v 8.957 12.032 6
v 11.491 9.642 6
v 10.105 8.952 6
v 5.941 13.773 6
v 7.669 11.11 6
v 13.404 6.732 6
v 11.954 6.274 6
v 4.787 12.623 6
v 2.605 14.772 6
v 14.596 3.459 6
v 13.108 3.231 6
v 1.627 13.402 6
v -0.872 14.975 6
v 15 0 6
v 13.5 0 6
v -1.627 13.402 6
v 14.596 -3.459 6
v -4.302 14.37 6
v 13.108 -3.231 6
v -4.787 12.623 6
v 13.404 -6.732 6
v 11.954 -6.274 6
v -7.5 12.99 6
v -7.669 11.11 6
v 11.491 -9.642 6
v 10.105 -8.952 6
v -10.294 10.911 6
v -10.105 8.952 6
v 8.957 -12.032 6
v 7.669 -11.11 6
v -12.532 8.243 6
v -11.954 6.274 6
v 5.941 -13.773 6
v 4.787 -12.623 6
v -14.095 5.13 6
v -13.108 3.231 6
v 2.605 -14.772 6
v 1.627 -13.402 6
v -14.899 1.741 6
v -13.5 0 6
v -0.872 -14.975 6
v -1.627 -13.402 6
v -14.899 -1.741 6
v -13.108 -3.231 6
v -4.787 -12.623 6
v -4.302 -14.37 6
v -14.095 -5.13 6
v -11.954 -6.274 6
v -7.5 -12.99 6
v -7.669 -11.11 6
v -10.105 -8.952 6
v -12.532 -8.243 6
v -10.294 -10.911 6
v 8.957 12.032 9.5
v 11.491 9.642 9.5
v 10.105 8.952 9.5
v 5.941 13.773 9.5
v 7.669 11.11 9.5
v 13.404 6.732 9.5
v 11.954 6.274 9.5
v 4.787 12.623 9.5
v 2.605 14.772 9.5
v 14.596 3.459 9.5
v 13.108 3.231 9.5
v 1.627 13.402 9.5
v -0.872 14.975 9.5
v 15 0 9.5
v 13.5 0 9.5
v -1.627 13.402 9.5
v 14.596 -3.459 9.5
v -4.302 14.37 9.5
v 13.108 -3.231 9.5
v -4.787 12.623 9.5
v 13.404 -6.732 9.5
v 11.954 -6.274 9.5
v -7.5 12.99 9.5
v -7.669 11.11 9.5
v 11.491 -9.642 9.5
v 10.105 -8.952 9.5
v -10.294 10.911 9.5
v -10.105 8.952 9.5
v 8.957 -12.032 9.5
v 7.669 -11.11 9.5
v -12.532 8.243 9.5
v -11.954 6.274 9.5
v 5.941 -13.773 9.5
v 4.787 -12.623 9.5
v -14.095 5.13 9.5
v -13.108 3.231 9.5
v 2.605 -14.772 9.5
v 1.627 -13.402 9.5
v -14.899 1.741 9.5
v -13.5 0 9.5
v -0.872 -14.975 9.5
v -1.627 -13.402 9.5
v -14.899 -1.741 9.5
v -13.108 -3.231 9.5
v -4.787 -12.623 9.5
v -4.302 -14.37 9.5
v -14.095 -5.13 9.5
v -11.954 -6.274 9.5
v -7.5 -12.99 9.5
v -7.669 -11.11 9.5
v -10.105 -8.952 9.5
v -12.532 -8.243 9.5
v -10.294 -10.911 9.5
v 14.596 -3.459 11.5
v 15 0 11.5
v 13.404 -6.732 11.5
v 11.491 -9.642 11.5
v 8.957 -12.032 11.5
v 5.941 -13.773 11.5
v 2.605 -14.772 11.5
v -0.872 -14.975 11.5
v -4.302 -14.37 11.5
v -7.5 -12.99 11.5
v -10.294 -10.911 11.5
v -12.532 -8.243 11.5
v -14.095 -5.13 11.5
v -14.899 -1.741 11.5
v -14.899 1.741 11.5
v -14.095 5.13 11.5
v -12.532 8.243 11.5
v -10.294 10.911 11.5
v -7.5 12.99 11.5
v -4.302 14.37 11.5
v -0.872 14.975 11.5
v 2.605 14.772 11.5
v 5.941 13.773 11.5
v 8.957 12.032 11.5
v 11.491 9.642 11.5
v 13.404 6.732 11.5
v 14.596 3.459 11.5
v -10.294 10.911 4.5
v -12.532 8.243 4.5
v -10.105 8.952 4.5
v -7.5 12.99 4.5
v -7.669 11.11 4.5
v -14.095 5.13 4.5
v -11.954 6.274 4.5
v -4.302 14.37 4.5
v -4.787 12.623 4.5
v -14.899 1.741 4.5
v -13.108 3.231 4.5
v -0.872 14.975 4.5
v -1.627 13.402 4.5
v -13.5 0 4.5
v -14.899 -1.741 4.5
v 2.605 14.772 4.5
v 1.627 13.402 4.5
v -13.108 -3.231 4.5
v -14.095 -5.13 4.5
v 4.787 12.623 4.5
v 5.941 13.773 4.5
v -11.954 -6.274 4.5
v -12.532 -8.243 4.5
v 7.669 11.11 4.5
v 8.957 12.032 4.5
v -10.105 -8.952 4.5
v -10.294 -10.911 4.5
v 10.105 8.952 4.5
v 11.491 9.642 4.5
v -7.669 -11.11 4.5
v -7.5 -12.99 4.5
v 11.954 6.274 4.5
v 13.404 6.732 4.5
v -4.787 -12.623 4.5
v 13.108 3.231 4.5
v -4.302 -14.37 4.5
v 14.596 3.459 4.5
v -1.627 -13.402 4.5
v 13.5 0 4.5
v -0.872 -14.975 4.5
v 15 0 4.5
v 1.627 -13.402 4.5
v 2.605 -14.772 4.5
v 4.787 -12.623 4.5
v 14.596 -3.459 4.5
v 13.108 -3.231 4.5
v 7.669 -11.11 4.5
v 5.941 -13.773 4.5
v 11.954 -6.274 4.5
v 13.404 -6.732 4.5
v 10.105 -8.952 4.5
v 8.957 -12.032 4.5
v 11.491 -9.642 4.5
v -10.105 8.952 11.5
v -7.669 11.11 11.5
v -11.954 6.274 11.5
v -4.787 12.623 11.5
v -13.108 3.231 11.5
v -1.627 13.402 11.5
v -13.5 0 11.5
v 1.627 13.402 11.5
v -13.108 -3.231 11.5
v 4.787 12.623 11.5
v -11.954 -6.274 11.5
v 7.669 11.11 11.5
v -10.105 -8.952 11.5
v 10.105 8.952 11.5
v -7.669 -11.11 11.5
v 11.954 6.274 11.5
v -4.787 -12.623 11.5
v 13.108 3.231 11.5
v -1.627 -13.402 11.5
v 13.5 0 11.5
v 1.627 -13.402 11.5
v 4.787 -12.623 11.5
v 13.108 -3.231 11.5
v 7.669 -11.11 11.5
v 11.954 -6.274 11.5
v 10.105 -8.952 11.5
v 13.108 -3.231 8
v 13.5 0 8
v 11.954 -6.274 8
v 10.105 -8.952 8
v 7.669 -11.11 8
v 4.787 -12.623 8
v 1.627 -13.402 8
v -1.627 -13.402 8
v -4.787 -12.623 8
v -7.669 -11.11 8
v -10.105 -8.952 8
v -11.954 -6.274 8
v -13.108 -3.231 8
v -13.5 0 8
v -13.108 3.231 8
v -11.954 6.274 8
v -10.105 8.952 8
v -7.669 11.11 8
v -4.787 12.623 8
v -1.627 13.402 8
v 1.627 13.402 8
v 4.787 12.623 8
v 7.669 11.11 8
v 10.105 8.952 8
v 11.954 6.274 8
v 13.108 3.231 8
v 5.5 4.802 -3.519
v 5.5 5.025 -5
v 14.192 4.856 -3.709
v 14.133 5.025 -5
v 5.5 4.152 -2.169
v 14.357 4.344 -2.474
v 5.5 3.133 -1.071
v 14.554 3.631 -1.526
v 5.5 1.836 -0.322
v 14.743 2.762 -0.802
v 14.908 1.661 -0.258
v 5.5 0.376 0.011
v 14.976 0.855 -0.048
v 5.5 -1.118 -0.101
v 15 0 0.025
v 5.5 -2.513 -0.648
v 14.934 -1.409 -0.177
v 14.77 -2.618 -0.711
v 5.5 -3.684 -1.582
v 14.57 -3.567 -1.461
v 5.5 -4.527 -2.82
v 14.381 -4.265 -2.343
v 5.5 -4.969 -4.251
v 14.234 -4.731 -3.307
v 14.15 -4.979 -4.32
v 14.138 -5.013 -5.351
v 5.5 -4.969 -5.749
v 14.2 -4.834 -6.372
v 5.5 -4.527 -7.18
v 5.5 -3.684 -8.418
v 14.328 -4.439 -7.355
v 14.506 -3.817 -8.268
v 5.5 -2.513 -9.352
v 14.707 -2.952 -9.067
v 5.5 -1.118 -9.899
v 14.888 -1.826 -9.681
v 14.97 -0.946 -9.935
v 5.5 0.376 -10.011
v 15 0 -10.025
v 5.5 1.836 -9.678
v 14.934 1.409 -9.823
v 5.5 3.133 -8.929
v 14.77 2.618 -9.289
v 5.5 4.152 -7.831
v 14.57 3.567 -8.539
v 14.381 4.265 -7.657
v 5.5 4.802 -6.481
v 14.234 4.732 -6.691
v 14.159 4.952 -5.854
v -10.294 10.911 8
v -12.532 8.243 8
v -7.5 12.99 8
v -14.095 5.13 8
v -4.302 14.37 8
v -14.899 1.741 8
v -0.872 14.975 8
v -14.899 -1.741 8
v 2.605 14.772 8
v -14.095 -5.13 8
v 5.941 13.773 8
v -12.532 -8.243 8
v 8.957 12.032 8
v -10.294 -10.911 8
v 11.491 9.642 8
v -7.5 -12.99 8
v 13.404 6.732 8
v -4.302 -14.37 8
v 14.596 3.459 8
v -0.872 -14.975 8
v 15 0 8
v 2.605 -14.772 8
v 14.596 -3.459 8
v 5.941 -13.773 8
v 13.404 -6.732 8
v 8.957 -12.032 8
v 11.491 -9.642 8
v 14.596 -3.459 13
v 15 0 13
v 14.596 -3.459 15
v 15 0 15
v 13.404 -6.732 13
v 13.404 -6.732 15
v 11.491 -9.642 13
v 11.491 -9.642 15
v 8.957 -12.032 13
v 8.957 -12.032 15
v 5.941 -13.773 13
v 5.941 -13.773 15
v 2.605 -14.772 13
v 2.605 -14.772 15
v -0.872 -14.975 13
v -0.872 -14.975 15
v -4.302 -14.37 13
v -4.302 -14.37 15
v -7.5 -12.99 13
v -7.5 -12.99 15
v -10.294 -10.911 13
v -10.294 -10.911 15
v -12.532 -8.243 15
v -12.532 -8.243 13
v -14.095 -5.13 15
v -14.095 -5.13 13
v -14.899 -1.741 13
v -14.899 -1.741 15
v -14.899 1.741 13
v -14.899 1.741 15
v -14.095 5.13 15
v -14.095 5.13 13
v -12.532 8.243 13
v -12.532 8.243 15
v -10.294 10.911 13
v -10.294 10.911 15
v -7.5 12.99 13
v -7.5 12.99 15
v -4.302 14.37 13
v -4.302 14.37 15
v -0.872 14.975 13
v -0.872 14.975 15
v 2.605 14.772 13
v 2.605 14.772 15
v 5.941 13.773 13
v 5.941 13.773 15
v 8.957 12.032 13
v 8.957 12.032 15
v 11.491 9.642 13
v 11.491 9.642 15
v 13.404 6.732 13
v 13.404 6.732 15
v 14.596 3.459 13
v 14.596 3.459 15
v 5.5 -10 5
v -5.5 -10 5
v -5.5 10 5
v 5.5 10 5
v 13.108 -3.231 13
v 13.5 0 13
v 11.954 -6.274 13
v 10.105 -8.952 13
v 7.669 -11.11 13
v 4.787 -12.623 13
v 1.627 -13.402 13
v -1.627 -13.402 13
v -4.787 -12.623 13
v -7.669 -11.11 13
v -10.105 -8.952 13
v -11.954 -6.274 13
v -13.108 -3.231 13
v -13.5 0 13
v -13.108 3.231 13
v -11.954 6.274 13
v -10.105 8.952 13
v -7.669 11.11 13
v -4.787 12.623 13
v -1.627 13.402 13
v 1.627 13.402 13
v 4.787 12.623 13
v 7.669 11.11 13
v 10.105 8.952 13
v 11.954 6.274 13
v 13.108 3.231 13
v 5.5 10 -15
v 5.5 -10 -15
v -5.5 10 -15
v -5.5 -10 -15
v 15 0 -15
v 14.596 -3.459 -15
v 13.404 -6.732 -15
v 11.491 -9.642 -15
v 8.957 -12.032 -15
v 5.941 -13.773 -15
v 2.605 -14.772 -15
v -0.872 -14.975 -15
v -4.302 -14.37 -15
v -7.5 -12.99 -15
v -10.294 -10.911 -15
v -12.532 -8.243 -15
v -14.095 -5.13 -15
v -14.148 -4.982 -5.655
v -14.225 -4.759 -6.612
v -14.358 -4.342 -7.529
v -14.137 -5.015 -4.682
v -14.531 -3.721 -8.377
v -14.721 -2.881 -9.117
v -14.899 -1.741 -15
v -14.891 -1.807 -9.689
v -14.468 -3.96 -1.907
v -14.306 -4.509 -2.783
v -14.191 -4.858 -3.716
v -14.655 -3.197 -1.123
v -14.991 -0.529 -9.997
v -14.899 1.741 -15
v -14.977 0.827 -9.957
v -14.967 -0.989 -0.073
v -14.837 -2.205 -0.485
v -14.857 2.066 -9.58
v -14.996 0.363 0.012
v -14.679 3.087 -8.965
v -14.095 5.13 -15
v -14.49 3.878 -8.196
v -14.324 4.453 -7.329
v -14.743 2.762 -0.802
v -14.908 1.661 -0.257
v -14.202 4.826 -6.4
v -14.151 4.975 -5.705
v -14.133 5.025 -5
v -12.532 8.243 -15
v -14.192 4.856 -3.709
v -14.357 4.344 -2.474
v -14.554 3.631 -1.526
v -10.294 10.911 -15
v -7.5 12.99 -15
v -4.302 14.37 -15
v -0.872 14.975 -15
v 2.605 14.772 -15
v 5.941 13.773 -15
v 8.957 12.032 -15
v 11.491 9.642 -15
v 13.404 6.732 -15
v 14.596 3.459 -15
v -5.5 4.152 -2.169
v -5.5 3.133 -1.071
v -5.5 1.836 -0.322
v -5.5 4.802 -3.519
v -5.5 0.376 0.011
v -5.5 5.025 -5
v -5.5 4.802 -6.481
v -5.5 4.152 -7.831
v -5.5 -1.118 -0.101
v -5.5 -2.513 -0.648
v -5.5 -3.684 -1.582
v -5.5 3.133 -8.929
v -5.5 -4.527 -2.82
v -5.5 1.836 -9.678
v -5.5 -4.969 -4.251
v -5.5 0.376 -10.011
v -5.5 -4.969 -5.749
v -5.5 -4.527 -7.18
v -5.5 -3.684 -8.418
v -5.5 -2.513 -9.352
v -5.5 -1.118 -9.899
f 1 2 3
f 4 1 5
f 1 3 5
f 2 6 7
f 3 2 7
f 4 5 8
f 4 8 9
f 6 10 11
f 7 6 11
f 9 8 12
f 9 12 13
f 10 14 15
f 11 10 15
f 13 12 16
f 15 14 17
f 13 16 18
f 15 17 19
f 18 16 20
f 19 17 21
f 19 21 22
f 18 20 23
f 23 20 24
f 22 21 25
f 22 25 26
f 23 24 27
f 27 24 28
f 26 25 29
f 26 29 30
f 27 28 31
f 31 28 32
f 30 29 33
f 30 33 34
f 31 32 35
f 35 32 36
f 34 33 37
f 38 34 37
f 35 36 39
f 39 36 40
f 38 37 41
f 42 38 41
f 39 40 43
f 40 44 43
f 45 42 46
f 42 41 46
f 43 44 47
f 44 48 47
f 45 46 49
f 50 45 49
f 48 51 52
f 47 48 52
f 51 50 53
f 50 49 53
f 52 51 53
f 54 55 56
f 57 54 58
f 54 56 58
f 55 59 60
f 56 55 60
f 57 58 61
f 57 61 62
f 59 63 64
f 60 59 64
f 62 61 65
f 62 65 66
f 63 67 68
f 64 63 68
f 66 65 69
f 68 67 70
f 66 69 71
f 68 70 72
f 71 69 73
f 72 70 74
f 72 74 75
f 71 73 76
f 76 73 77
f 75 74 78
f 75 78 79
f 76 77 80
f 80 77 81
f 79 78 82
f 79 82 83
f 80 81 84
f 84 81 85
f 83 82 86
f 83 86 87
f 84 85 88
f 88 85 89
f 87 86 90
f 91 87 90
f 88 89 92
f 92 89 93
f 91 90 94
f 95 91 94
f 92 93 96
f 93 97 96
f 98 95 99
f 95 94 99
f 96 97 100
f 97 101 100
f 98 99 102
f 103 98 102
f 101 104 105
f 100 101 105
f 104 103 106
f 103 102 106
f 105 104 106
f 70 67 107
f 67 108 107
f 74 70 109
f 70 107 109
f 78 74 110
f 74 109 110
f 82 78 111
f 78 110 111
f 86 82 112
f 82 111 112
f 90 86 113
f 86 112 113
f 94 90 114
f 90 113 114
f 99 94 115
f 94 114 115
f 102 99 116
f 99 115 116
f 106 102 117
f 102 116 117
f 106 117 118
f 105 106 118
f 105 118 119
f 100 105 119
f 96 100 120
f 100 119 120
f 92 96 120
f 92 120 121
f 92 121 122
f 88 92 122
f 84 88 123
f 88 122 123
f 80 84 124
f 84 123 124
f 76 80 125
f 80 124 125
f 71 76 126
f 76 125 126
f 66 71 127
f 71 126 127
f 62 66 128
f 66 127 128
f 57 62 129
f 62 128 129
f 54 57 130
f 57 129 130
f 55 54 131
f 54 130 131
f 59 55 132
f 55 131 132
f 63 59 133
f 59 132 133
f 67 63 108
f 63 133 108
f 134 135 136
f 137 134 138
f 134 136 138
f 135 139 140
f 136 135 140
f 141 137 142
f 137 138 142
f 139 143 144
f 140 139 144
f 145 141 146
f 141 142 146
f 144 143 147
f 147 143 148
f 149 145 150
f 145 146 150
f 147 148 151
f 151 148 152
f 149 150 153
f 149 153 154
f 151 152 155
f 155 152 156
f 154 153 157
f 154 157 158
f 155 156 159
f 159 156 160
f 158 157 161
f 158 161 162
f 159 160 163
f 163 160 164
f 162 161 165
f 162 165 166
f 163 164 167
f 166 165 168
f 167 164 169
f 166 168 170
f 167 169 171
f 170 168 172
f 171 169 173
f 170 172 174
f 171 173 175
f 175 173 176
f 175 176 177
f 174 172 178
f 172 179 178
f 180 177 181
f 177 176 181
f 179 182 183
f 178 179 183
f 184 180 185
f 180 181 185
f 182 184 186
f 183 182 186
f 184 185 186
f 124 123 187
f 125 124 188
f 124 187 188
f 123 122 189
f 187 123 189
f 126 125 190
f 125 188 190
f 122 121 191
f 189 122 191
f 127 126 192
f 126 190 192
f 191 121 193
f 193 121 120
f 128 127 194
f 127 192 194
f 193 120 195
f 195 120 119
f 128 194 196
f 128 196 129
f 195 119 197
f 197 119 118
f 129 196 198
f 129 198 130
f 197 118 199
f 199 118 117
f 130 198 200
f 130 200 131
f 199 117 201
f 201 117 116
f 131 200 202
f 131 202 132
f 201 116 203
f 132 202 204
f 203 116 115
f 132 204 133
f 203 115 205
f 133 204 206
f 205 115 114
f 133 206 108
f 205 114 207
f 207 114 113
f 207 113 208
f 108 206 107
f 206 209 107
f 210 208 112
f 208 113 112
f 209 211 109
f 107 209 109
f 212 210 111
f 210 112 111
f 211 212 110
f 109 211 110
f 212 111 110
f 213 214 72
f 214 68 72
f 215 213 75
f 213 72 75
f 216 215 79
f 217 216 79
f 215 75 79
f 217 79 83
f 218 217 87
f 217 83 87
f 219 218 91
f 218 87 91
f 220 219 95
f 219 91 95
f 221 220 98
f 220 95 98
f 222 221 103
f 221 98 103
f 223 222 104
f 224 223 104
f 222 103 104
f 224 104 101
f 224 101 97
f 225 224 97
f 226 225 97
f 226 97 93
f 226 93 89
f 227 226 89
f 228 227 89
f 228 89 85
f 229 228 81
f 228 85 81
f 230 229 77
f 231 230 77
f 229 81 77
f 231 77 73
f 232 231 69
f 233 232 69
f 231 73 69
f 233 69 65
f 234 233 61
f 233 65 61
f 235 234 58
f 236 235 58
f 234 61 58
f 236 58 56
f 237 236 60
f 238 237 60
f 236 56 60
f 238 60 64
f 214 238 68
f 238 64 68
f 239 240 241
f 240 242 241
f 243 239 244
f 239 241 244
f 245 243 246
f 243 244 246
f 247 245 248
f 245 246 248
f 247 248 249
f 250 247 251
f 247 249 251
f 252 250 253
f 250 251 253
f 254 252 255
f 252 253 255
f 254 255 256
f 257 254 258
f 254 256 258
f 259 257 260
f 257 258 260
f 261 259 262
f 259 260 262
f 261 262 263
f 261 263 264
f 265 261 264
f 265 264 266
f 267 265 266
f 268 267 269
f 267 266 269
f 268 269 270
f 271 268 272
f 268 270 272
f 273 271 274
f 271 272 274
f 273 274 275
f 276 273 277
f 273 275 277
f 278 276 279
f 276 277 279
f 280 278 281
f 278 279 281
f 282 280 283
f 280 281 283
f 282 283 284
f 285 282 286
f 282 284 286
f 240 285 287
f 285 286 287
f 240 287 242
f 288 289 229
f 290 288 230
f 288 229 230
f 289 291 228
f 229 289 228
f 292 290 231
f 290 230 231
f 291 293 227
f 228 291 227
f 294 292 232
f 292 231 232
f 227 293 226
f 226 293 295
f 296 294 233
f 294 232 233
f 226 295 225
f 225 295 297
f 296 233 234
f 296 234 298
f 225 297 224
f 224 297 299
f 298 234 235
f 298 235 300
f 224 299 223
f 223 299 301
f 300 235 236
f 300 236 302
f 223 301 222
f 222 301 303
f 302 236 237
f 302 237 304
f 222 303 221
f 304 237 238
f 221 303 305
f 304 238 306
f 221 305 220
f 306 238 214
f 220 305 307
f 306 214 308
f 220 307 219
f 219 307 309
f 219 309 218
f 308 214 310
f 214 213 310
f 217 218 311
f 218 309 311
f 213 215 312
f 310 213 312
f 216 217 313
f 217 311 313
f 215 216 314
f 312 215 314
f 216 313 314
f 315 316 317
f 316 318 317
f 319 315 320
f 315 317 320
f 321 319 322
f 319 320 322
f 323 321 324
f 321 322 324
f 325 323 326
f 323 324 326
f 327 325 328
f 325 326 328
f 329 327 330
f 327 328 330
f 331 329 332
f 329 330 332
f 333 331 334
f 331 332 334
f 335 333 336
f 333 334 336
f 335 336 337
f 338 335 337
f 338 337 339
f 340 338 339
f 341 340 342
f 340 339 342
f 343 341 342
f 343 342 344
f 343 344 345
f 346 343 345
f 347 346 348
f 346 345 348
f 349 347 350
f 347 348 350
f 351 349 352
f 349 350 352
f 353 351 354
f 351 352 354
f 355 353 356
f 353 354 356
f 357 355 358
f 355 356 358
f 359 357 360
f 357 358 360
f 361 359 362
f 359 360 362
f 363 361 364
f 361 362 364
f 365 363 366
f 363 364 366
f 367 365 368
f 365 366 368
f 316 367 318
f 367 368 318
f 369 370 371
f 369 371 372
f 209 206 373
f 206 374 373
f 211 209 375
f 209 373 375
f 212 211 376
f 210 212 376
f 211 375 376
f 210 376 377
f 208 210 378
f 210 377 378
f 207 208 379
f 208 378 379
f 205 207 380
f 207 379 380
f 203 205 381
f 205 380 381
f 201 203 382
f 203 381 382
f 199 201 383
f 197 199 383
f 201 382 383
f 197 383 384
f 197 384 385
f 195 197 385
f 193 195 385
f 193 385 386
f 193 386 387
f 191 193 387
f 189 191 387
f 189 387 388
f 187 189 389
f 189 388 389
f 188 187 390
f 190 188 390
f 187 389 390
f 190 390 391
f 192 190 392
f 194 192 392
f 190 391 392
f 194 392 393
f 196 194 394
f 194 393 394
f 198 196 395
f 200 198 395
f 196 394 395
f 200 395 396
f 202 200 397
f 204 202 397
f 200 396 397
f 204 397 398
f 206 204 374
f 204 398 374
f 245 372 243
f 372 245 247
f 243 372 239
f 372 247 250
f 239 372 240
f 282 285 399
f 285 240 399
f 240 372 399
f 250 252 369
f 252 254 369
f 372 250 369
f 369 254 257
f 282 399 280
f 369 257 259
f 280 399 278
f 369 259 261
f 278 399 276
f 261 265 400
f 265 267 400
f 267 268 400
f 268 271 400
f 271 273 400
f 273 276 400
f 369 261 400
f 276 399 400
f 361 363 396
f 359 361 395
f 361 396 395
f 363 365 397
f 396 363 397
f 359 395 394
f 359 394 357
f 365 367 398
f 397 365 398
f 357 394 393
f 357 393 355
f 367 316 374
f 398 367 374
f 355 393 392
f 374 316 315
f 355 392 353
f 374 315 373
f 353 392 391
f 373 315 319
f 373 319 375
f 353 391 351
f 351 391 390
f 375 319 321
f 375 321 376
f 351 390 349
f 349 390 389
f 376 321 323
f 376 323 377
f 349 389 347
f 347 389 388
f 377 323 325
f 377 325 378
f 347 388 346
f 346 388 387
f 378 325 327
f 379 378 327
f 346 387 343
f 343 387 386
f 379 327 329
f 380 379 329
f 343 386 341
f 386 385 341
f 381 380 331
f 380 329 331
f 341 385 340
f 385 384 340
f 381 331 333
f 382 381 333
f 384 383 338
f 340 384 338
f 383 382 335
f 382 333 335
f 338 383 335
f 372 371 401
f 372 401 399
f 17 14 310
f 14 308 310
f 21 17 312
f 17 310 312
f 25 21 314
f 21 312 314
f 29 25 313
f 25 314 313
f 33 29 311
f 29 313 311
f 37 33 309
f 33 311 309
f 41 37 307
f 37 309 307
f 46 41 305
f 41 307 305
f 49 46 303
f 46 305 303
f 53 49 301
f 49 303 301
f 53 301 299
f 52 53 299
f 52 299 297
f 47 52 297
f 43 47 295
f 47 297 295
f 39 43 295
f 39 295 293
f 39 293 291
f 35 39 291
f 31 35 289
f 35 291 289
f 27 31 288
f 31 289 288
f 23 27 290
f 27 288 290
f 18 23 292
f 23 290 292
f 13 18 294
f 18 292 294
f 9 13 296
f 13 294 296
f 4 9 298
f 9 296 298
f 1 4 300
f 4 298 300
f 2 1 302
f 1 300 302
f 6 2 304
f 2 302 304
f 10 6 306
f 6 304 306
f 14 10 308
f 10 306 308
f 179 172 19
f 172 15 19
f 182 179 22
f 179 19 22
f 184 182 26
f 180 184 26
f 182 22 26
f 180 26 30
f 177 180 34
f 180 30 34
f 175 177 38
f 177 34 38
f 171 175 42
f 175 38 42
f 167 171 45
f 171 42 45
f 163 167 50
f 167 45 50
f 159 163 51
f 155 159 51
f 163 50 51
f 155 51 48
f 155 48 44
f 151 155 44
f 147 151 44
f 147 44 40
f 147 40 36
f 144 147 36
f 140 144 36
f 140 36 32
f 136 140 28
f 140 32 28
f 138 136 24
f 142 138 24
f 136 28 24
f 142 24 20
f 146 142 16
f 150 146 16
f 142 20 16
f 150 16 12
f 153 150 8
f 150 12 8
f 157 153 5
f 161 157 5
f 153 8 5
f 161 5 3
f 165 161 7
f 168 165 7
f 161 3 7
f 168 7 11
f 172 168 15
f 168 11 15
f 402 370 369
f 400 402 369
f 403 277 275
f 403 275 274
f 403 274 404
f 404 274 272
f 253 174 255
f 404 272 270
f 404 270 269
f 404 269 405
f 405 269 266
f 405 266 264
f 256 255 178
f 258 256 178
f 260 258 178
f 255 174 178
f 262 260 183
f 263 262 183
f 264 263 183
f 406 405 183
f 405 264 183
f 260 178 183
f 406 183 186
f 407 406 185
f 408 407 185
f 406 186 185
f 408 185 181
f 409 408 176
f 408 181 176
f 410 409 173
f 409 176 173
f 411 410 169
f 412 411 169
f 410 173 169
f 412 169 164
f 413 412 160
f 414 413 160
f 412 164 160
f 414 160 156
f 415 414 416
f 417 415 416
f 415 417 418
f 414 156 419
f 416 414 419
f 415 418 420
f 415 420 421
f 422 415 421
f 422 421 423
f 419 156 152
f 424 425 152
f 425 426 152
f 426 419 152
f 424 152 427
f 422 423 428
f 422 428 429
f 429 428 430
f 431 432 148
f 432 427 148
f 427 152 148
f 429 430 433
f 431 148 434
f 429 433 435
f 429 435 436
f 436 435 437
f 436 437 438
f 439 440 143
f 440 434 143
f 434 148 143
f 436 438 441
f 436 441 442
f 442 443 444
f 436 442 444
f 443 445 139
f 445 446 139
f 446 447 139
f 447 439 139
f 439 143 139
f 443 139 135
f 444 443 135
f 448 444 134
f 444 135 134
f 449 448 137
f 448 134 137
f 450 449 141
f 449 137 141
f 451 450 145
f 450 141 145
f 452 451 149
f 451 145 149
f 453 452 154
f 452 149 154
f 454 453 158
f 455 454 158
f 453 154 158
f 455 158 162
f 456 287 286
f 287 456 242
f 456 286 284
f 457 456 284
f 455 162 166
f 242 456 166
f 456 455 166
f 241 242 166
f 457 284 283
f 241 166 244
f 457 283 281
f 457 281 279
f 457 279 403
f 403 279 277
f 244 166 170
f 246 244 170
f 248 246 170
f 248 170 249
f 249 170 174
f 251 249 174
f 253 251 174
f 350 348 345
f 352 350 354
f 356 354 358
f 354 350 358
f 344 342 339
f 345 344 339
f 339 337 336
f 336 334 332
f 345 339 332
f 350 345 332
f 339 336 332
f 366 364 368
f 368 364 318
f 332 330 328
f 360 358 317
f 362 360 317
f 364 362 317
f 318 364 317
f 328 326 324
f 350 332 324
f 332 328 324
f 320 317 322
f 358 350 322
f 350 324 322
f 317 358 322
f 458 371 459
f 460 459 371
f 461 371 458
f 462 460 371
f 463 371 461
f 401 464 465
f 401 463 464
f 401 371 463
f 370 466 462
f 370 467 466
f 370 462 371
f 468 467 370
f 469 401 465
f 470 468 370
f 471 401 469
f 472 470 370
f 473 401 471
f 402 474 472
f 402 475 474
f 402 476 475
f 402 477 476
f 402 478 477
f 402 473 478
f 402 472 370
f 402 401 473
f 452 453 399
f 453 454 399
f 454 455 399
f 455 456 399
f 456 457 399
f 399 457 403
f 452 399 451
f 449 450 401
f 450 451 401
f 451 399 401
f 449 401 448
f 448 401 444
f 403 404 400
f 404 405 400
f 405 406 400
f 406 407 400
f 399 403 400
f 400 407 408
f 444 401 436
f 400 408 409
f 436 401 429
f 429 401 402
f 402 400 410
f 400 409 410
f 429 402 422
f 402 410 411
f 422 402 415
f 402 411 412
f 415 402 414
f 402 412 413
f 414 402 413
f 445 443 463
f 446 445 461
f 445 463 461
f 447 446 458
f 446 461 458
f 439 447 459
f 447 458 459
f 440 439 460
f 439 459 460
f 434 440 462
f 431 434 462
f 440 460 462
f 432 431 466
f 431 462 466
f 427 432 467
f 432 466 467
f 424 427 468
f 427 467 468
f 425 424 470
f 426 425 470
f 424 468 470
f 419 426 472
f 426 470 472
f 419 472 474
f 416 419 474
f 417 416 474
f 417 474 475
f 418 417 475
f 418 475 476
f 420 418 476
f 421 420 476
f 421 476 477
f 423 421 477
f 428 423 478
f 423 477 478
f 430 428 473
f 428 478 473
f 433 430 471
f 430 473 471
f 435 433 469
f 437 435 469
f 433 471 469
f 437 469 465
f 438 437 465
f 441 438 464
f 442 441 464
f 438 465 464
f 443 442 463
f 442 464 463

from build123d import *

# Parameters (mm, degrees)
F2_R     = 5.025
F3_DEPTH = 25
F4_W     = 11
F4_H     = 20
F5_DEPTH = 20


with BuildPart() as f1:
    # F0 (on Front) → F1 (revolve)
    with BuildSketch(Plane.XZ):
        Polygon((15, 15), (0, 15), (0, -15), (15, -15), (15, 4.5), (13.5, 4.5), (13.5, 6), (15, 6), (15, 8), (13.5, 8), (13.5, 9.5), (15, 9.5), (15, 11.5), (13.5, 11.5), (13.5, 13), (15, 13), align=None)
    revolve(axis=Axis((0, 0, 0), (0, 0, -1)))

    # F2 (on Right) → F3 (cut, symmetric)
    with BuildSketch(Plane.YZ):
        with Locations((0, -5)):
            Circle(F2_R)
    extrude(amount=F3_DEPTH, both=True, mode=Mode.SUBTRACT)

    # F4 (on face) → F5 (cut)
    with BuildSketch(Plane(origin=(0, 0, -15), x_dir=(1, 0, 0), z_dir=(0, 0, -1))):
        Rectangle(F4_W, F4_H)
    extrude(amount=-F5_DEPTH, mode=Mode.SUBTRACT)


solid = f1.part
